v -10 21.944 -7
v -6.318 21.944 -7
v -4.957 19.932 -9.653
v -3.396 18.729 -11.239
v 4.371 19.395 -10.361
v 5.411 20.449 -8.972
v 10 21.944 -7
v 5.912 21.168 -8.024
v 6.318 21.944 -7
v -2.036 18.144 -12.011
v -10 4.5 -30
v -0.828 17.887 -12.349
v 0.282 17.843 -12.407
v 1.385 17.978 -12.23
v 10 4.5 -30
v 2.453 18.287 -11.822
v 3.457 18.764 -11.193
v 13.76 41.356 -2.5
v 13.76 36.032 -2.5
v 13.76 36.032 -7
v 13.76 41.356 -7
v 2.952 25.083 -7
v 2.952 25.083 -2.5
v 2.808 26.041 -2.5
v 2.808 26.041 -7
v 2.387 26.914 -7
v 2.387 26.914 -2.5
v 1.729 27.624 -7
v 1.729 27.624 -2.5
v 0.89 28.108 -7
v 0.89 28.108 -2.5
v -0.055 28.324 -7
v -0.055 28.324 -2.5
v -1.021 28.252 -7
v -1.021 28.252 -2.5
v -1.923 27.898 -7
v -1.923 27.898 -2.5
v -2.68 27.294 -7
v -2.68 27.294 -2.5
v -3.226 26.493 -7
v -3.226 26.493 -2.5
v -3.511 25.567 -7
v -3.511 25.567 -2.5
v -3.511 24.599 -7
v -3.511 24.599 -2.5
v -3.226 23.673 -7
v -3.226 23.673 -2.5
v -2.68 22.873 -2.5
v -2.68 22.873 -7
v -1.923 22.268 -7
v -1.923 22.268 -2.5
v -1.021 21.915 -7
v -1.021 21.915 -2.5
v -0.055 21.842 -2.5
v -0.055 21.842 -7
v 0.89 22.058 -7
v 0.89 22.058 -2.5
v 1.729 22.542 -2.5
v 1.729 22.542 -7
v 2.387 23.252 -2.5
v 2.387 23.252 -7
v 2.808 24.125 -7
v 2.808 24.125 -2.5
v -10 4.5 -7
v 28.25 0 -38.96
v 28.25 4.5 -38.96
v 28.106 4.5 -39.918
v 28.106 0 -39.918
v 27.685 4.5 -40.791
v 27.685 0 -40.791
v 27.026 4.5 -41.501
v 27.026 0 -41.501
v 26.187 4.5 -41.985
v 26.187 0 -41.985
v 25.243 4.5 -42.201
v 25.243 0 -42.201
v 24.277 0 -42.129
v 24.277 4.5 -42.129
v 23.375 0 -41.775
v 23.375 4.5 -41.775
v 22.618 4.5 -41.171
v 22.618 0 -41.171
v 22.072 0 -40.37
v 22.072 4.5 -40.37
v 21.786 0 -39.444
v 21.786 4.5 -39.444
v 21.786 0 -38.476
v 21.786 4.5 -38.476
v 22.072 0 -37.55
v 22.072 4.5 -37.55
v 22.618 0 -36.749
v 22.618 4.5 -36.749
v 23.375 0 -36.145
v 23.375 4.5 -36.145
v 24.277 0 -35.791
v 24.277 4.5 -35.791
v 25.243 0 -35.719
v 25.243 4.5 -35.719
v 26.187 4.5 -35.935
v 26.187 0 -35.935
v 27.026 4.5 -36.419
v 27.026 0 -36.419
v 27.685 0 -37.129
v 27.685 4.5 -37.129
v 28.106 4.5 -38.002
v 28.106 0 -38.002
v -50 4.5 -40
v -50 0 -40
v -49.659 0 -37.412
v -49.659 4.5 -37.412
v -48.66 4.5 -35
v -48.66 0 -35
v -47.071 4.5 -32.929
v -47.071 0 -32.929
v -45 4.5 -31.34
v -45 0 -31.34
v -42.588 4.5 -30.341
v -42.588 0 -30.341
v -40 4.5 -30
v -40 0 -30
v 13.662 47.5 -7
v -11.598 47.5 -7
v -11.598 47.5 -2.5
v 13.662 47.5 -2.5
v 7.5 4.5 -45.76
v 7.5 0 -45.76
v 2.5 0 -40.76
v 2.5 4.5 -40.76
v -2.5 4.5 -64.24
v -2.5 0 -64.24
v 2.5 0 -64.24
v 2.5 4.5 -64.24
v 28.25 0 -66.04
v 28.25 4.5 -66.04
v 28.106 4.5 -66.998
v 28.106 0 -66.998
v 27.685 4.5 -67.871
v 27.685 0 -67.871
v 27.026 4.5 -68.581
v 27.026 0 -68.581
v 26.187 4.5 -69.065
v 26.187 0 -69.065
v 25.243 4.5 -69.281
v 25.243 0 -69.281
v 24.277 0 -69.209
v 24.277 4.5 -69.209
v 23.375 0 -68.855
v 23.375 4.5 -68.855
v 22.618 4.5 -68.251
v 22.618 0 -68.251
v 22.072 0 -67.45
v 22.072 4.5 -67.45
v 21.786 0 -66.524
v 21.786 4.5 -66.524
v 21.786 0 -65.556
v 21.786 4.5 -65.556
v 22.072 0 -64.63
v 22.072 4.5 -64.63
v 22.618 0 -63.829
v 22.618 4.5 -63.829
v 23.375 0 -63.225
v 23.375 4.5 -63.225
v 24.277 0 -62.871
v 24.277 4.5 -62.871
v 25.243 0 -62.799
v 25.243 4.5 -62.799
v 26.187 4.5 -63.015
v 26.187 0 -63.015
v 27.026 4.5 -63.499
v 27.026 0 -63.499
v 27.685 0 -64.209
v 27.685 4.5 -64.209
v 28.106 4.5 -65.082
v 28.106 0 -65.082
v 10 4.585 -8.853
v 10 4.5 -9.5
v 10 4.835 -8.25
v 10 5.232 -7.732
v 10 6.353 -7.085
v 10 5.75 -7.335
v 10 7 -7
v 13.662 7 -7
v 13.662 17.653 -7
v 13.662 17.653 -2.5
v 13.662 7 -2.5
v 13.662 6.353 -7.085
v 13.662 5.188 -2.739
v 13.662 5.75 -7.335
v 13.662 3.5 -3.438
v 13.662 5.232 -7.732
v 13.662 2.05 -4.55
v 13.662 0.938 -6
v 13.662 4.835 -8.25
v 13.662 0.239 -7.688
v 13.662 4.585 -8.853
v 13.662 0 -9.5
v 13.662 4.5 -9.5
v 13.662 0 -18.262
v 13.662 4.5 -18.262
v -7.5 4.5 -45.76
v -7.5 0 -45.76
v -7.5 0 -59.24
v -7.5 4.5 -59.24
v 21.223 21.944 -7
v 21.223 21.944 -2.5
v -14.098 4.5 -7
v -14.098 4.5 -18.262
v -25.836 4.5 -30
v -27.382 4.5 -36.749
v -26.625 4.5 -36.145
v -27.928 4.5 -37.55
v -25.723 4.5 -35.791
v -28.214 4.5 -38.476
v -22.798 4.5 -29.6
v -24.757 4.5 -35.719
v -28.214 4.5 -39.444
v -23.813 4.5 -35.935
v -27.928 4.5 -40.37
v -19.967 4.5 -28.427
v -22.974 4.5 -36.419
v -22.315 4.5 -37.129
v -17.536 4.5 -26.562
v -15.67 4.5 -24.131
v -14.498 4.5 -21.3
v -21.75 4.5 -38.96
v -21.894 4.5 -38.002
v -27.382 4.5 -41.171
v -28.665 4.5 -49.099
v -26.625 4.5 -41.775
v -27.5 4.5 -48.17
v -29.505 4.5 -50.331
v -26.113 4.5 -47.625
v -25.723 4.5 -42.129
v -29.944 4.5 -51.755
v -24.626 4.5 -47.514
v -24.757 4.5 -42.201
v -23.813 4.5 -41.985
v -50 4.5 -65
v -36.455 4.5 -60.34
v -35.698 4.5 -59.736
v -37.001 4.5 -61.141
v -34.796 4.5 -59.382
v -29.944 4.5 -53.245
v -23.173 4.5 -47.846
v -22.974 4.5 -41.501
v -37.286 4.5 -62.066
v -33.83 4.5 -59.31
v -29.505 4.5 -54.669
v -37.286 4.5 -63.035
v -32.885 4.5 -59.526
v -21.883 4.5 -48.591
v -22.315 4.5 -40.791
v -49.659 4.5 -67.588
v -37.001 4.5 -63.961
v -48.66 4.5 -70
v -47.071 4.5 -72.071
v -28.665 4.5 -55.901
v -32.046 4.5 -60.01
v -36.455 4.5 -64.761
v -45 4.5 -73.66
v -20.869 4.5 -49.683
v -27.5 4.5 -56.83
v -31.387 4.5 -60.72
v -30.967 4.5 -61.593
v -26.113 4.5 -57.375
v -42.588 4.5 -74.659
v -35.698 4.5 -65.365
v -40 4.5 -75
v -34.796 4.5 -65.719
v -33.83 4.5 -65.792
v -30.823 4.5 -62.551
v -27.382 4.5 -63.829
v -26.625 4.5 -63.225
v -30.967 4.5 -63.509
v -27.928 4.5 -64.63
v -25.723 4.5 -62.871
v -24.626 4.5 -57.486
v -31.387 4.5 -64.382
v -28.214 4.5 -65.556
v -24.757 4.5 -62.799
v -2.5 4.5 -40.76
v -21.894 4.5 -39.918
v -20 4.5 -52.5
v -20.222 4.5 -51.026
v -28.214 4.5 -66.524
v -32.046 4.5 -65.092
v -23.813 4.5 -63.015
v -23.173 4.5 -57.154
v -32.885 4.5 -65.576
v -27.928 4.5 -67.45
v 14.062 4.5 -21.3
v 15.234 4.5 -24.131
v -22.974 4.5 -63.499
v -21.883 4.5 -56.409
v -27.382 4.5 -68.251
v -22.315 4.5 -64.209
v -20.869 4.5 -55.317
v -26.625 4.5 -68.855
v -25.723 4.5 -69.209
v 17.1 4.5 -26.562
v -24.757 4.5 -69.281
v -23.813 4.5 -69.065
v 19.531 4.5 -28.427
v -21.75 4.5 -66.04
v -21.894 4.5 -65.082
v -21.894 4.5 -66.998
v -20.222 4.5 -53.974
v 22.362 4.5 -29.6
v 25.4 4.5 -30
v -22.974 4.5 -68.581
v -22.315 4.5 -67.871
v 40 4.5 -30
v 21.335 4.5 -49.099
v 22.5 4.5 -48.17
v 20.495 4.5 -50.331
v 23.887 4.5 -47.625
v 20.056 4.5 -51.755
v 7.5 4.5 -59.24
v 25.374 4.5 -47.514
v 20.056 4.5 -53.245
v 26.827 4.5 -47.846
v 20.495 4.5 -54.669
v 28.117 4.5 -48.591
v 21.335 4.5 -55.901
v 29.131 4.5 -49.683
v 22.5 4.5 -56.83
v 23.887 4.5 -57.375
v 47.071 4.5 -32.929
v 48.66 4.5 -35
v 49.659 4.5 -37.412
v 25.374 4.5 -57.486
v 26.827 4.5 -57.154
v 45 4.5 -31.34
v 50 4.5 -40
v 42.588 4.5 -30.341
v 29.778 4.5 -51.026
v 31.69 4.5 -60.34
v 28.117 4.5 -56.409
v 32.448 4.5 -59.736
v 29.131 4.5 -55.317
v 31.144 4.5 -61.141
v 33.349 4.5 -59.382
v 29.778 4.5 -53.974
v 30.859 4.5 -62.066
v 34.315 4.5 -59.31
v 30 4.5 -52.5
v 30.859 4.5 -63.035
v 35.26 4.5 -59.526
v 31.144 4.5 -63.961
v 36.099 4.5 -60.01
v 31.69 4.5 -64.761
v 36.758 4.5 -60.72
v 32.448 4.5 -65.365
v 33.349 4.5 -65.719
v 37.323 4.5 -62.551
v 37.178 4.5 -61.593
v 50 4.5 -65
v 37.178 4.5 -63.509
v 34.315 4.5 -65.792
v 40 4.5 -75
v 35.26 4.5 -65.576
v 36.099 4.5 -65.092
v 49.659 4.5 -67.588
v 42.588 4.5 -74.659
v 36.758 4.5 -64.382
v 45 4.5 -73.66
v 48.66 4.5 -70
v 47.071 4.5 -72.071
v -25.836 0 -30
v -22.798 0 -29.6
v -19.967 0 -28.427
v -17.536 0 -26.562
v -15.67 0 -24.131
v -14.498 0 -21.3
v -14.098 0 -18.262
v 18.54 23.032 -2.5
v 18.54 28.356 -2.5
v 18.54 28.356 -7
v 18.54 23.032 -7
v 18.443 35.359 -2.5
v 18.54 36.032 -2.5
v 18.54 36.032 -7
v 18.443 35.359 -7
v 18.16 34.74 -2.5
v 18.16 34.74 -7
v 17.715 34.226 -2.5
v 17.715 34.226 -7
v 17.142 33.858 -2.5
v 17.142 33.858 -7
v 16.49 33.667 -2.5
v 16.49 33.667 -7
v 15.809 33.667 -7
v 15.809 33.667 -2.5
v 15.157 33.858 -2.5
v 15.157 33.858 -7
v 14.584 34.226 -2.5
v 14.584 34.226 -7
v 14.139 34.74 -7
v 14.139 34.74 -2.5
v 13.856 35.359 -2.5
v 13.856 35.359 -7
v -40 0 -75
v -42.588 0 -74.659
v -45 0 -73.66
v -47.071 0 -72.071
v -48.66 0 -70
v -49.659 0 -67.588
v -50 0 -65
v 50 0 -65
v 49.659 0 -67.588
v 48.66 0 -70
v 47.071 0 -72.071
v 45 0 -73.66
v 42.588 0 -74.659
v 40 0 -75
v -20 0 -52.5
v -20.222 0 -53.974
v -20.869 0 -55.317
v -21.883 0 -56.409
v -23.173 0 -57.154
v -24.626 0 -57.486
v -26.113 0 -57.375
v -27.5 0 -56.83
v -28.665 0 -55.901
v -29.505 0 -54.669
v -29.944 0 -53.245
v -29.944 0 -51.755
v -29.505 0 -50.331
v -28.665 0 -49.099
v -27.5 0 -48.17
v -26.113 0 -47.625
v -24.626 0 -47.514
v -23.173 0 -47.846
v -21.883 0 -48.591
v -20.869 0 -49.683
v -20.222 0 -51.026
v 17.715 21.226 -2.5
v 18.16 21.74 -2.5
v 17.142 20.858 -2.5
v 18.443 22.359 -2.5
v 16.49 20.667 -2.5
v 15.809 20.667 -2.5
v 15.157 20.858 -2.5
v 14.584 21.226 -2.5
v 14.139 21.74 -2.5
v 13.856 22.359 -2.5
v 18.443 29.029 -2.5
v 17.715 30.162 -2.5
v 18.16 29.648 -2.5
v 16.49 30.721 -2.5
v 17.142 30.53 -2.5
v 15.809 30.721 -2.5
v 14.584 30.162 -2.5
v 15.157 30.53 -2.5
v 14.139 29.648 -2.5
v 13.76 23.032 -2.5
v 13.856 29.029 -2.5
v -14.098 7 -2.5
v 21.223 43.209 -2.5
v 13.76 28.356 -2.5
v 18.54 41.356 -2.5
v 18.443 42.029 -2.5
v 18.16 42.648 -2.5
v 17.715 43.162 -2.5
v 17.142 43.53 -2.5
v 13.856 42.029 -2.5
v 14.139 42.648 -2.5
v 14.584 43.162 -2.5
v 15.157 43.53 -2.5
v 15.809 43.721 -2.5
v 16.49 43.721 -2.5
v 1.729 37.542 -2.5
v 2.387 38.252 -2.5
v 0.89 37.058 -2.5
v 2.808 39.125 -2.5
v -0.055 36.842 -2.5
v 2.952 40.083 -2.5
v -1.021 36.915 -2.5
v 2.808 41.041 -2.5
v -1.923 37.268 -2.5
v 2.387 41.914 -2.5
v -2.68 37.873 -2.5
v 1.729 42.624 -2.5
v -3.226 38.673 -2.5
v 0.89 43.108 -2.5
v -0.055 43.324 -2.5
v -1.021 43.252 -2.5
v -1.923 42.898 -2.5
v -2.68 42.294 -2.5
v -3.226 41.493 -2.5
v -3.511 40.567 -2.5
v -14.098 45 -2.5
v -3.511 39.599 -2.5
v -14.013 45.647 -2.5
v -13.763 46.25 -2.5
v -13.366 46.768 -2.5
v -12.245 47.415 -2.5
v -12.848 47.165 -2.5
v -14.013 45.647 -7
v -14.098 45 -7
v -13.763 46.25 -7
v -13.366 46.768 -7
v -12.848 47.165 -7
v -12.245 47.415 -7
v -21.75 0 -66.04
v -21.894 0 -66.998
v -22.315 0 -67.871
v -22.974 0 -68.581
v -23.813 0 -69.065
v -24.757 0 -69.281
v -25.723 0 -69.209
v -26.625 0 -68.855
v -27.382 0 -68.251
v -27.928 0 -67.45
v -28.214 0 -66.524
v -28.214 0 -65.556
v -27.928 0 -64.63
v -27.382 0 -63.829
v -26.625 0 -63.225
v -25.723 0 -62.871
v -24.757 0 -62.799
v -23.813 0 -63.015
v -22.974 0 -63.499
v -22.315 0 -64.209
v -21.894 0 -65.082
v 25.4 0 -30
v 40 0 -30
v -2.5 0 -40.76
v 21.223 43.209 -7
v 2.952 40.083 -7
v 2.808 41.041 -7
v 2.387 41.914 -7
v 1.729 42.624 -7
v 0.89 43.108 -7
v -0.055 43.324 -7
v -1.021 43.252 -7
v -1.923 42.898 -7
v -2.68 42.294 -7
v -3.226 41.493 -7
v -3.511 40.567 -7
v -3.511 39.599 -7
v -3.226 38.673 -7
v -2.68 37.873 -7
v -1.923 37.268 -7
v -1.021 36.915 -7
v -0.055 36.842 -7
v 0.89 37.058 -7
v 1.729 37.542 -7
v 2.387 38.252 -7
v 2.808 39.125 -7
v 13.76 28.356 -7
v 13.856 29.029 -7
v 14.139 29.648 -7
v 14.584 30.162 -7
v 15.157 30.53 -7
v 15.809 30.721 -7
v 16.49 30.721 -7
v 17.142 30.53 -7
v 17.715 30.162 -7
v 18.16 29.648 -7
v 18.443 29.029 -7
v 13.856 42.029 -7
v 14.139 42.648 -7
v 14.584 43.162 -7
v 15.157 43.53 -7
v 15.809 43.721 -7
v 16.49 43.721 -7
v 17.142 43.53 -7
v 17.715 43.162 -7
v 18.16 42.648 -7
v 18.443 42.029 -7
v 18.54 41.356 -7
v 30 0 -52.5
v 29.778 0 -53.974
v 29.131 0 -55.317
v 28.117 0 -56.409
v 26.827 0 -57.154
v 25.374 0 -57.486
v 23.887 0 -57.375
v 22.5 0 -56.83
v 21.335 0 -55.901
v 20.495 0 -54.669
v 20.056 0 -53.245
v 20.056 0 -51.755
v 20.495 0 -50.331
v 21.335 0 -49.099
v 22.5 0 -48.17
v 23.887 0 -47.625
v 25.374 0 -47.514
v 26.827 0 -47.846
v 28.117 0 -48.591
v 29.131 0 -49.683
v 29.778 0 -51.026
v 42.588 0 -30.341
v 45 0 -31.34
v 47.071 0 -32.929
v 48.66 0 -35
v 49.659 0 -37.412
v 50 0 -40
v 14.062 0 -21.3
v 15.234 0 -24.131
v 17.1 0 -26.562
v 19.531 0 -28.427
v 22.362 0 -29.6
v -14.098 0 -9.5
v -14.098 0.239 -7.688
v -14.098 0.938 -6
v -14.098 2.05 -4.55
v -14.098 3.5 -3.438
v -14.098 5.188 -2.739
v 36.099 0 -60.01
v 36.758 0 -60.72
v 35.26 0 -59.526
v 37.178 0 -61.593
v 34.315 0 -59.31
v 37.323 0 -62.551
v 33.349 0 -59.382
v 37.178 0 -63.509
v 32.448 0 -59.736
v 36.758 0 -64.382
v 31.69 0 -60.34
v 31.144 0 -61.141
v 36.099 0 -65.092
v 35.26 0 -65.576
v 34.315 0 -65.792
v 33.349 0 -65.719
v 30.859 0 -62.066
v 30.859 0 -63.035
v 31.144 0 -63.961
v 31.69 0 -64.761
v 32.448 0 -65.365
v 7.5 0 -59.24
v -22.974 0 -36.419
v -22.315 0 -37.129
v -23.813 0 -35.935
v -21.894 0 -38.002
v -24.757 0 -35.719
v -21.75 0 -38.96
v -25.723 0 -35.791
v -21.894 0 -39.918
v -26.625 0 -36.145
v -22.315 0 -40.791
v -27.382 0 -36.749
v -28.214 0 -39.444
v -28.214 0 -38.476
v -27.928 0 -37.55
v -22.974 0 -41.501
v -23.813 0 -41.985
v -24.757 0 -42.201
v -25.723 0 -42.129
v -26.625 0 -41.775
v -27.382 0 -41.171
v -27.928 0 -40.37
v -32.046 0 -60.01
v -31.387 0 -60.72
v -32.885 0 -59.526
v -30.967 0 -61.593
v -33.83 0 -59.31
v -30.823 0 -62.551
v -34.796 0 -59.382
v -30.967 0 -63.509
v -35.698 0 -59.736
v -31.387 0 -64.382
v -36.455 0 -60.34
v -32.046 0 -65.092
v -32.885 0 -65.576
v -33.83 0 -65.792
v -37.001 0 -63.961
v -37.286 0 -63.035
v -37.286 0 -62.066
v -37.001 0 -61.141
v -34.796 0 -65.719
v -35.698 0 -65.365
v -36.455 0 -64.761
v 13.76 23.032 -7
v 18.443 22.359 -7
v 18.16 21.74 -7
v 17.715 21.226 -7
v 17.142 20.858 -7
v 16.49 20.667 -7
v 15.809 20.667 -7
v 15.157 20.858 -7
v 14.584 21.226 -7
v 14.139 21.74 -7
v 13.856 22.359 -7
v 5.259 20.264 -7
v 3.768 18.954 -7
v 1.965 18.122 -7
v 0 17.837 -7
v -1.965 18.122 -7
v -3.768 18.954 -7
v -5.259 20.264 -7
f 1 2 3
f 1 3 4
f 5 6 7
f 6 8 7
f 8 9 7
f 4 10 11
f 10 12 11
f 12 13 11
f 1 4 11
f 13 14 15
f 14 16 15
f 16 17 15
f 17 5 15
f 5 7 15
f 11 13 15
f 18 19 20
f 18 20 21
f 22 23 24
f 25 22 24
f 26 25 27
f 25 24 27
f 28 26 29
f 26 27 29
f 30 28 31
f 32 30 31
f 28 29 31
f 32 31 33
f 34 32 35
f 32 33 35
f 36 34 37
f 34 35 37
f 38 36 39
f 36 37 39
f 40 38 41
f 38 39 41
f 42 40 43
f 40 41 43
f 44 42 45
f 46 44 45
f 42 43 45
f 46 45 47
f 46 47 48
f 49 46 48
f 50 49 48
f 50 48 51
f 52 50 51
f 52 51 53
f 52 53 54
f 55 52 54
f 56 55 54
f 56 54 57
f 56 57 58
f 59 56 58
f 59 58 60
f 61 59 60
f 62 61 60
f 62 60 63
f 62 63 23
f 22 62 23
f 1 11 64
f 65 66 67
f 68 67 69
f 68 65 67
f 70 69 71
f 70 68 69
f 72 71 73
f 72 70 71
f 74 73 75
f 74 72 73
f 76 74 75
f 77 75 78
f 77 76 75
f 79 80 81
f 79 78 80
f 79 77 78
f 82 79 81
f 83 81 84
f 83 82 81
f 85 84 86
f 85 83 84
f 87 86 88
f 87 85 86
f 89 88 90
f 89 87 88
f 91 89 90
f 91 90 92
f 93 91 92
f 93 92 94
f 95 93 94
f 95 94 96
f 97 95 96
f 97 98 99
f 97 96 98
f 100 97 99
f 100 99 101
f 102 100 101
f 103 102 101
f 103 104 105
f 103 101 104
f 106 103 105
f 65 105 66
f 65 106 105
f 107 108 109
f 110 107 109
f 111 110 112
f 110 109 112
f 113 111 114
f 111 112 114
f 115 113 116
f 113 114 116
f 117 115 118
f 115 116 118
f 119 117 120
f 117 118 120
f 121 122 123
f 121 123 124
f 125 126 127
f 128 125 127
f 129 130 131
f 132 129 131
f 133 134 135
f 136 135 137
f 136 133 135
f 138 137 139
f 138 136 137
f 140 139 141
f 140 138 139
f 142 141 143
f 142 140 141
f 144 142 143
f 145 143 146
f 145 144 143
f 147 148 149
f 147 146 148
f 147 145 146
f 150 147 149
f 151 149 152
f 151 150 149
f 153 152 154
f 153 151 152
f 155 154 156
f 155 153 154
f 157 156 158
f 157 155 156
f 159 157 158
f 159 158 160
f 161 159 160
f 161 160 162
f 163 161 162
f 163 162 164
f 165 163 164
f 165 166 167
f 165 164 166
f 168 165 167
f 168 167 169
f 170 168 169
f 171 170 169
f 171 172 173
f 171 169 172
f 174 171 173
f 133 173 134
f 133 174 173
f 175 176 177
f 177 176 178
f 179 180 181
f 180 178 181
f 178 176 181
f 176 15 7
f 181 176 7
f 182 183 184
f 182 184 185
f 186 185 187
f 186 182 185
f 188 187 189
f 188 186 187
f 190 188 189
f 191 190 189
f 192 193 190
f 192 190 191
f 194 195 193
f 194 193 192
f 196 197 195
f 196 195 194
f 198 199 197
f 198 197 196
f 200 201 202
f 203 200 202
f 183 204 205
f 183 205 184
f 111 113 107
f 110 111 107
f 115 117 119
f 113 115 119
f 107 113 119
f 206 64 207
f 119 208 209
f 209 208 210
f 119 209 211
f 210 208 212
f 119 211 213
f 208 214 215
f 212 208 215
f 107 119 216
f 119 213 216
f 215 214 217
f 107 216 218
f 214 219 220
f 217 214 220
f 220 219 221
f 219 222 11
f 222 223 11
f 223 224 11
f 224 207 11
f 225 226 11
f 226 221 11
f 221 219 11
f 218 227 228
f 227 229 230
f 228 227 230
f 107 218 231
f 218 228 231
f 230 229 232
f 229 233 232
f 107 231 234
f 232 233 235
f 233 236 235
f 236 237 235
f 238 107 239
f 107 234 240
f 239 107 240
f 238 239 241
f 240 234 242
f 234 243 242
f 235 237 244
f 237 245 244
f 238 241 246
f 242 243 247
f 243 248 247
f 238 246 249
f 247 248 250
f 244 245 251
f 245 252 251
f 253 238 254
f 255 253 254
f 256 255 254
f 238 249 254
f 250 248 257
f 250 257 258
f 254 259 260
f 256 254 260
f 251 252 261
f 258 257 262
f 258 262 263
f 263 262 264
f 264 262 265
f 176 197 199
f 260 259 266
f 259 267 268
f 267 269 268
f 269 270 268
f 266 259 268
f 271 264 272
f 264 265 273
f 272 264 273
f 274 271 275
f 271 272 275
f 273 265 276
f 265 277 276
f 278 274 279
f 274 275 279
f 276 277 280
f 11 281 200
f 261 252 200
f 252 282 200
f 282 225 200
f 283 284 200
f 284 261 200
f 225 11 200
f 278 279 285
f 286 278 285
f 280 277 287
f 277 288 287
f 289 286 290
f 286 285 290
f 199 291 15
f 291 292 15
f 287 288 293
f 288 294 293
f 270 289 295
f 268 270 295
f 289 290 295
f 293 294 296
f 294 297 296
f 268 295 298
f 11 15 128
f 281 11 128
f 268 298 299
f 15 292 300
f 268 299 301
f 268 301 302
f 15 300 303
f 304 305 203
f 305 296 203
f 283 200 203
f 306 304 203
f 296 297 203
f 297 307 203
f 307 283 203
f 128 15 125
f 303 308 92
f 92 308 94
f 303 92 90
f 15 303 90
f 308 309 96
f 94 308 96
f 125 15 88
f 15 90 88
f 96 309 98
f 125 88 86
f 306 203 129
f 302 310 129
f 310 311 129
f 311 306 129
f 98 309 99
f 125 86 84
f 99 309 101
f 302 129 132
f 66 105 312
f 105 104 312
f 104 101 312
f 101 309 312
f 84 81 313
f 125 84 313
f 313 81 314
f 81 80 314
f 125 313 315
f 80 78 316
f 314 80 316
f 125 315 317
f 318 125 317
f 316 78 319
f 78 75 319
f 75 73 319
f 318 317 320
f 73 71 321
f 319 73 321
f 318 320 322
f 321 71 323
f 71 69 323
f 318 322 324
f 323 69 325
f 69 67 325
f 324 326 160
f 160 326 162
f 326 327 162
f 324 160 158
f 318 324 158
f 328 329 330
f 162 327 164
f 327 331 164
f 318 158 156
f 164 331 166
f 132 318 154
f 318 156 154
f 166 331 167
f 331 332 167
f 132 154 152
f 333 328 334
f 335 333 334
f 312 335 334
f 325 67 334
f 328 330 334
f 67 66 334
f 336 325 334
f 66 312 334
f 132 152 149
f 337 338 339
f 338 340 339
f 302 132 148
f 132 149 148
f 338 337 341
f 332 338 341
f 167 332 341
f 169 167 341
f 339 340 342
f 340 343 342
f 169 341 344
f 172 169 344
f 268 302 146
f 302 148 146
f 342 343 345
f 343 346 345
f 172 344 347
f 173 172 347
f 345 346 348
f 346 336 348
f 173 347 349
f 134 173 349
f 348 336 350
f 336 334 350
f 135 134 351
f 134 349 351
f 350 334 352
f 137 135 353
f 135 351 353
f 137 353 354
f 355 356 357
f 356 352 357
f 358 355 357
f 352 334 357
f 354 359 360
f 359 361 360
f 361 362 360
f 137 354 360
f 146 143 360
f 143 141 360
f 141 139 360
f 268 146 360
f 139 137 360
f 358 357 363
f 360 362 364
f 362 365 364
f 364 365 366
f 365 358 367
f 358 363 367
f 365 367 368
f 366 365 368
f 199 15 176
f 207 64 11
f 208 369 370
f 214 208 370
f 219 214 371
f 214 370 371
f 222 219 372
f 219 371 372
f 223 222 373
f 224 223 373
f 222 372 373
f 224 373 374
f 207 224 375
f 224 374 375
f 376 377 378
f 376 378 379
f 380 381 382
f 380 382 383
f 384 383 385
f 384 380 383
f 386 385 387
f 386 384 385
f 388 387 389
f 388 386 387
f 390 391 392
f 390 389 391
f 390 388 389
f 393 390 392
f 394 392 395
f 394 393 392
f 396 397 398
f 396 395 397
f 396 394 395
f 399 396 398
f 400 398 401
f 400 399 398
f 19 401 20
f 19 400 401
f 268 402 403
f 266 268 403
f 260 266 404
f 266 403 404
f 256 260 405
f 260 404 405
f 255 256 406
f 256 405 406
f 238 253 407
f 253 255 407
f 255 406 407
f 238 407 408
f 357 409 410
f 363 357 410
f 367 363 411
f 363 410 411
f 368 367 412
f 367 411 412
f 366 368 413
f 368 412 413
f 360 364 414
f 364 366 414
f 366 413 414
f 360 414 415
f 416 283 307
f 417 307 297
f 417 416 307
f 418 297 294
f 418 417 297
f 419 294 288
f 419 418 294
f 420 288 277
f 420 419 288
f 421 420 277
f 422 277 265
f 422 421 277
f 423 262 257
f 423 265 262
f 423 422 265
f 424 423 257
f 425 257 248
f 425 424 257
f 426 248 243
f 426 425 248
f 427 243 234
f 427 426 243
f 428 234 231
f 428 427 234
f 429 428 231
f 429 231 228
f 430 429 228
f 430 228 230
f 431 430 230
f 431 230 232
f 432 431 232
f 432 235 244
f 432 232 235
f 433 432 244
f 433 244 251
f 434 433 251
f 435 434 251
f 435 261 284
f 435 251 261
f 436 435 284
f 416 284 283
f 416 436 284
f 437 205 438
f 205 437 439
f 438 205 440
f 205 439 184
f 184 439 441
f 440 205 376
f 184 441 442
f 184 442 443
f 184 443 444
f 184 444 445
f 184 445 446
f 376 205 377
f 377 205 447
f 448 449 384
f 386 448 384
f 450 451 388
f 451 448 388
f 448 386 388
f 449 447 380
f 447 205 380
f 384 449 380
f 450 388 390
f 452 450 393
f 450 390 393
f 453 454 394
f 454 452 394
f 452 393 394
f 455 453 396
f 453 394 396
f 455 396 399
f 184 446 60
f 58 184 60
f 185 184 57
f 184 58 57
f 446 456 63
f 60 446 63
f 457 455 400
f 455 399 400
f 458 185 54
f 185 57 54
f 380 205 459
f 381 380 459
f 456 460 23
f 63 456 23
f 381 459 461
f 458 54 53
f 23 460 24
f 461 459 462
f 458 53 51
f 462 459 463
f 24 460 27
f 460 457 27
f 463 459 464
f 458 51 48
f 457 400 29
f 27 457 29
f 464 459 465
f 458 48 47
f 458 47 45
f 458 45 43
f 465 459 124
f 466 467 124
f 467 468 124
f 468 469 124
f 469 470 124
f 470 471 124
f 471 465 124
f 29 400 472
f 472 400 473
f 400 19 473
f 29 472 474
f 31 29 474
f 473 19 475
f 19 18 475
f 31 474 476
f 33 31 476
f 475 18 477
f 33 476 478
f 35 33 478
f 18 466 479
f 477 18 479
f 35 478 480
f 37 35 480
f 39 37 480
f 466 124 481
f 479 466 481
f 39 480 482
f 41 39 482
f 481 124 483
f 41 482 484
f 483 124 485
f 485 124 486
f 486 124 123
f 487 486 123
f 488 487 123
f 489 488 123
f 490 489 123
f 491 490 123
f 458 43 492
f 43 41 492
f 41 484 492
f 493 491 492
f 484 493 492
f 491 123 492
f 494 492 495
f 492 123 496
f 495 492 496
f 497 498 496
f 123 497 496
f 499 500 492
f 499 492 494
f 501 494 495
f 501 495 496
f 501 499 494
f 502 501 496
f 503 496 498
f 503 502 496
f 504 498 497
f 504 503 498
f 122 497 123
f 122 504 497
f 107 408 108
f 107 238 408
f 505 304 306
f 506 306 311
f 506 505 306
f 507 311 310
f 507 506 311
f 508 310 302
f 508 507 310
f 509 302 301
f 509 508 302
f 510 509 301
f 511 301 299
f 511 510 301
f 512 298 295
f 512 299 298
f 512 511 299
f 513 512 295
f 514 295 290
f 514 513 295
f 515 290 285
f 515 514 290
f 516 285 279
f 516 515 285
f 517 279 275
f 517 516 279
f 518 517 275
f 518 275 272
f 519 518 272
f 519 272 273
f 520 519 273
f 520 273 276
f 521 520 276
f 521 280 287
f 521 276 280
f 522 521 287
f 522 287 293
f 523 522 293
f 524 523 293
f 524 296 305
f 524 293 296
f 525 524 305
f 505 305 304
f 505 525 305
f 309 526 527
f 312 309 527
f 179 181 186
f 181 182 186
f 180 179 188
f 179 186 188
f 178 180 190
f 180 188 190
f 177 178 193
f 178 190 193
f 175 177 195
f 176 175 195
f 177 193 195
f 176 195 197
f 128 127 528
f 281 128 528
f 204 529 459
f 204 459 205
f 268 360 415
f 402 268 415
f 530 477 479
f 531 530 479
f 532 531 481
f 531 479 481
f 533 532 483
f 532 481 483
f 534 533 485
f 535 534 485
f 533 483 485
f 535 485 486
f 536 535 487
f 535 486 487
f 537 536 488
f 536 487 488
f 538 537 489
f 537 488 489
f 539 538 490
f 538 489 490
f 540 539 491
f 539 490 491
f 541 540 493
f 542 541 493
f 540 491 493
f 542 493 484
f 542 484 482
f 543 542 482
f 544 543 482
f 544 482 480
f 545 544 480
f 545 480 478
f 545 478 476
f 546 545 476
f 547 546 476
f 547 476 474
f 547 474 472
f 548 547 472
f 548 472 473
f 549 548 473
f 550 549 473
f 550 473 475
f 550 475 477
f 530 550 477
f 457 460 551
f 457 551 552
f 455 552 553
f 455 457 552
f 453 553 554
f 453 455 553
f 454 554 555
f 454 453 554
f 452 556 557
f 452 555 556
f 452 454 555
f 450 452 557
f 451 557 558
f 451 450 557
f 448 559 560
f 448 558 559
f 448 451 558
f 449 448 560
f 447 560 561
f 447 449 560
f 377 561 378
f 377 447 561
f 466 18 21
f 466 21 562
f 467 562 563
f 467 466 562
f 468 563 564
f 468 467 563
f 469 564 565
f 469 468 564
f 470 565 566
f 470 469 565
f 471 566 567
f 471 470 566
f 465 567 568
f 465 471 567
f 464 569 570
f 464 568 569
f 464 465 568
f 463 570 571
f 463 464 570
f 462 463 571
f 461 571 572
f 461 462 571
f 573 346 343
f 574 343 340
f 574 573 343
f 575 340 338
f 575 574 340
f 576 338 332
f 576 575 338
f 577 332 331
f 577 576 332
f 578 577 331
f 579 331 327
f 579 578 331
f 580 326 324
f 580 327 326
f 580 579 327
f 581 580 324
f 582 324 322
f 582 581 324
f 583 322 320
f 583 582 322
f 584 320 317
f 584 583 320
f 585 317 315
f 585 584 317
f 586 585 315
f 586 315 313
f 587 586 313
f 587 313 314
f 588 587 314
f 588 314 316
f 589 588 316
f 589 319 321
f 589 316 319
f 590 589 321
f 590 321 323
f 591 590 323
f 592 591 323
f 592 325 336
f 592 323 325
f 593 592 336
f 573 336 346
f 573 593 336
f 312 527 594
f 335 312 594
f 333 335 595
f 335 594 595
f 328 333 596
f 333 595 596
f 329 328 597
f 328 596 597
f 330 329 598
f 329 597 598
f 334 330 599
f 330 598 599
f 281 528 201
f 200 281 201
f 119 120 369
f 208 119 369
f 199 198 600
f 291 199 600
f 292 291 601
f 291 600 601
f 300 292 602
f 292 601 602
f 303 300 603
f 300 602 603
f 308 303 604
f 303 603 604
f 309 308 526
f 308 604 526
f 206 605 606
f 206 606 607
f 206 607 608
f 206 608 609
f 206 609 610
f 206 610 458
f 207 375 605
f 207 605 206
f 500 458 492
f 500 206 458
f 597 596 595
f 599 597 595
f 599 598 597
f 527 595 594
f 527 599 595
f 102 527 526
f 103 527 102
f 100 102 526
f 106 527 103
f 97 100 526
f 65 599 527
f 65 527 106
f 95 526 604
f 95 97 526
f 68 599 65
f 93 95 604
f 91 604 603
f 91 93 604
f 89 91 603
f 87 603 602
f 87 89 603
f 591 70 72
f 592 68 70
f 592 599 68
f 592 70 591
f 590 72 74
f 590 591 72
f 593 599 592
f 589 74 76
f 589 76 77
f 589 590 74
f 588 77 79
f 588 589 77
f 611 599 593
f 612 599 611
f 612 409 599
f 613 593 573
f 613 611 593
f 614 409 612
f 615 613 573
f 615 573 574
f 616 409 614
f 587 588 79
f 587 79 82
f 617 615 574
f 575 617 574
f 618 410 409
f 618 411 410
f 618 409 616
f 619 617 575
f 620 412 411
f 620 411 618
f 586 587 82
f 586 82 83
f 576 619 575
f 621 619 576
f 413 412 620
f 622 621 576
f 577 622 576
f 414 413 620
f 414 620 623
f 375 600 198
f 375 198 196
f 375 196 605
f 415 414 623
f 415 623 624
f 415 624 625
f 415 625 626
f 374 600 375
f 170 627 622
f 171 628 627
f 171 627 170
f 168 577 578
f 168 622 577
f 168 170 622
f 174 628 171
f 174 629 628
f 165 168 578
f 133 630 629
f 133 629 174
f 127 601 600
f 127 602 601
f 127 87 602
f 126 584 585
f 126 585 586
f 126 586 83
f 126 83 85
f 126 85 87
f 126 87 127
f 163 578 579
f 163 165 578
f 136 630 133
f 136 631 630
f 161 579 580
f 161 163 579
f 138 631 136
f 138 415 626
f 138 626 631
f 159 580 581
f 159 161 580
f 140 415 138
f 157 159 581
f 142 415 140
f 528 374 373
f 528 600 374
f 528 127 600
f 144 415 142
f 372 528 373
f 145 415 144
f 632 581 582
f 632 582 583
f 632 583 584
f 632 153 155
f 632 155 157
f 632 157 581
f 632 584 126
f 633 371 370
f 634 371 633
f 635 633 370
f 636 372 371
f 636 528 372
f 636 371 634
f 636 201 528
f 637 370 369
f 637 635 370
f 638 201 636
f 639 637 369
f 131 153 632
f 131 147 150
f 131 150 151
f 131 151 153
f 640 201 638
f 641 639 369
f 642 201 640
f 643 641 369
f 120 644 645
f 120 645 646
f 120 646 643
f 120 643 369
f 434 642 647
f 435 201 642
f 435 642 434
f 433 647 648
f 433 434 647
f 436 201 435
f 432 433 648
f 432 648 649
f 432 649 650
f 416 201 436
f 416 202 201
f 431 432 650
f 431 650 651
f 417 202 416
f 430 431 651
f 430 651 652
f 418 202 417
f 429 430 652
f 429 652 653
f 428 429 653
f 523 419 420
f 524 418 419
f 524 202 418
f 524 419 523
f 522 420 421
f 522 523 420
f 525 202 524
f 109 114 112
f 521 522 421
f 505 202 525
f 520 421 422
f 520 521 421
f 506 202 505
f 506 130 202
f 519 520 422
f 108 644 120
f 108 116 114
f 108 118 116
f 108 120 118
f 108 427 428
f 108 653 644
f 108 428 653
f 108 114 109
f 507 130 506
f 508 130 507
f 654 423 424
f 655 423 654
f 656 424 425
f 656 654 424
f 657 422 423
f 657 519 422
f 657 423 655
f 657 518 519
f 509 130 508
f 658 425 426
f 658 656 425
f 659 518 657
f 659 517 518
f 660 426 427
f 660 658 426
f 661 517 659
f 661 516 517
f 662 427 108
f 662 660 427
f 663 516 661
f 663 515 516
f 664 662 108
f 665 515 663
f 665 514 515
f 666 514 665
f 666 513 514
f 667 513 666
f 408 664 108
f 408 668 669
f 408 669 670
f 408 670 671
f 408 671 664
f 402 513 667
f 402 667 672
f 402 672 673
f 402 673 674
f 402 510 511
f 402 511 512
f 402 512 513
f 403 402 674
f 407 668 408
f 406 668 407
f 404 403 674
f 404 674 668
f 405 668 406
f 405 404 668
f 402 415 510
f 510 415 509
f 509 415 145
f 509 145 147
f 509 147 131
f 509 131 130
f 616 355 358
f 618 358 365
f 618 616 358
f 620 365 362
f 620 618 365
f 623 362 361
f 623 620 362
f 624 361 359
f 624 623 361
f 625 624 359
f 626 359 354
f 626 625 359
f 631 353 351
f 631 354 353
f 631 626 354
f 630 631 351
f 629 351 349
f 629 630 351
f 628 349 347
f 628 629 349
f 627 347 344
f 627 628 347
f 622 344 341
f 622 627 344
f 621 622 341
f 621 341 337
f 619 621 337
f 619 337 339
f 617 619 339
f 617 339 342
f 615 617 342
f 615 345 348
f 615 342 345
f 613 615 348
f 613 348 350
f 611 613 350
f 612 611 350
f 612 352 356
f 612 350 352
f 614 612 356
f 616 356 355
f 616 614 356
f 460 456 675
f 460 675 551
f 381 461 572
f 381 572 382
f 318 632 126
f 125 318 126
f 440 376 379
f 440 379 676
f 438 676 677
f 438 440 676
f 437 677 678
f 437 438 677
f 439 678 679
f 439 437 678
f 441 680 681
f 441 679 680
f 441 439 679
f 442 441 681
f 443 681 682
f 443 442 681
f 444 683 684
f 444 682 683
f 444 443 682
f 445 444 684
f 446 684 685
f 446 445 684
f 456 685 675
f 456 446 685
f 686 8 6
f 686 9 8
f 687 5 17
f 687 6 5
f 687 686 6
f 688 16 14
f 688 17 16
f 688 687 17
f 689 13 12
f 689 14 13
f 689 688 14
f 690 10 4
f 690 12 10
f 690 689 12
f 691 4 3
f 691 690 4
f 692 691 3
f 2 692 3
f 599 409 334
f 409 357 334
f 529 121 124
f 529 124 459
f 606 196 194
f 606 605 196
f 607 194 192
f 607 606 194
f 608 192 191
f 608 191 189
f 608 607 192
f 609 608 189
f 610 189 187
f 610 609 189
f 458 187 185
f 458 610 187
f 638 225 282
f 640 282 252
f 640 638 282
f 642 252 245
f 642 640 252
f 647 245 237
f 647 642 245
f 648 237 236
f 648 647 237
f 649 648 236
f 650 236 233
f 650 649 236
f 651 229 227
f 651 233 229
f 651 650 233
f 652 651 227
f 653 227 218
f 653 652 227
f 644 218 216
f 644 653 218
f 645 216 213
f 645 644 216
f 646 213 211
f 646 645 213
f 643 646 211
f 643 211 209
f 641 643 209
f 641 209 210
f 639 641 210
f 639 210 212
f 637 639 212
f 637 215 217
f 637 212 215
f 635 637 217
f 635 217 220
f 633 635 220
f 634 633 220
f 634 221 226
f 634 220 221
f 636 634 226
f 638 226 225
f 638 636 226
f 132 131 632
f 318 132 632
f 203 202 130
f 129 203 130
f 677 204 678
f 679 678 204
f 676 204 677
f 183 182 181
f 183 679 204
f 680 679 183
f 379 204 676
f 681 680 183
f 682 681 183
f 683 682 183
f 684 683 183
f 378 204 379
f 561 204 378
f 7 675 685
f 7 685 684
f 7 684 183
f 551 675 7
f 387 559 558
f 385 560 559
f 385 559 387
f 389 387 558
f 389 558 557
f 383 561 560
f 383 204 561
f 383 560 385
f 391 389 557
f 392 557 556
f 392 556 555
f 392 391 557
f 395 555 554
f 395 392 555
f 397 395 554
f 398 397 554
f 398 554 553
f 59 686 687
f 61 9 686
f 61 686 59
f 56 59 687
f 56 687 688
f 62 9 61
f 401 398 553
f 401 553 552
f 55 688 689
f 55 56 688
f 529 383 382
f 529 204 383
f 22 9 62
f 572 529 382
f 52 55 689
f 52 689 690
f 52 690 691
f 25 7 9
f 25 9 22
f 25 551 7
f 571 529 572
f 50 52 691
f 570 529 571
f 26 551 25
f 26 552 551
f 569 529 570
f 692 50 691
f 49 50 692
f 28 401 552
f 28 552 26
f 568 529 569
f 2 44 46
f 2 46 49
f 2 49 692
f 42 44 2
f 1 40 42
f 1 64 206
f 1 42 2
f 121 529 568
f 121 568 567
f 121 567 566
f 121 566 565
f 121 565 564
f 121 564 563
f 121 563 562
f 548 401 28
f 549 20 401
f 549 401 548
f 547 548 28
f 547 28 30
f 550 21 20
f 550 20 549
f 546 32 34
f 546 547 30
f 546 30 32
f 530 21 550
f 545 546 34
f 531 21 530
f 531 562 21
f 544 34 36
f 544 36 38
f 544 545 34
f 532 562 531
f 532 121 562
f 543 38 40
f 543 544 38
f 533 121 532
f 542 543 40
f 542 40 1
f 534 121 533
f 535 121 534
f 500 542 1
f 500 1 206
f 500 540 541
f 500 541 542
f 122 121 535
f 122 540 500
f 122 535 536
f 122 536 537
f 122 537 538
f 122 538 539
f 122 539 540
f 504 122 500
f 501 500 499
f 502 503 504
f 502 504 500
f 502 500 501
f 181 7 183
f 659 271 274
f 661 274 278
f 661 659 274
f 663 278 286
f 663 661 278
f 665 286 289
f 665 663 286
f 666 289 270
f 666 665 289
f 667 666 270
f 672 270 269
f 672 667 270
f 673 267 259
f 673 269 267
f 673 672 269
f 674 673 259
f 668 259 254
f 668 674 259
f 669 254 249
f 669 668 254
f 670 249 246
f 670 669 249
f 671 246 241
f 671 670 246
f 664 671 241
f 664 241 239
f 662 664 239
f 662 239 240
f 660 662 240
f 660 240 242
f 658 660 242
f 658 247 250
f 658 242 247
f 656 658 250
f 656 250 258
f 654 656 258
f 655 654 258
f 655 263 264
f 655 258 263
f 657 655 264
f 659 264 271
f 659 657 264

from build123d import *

# Parameters (mm, degrees)
BOSS_EXTRUDE1_DEPTH       = 50
SKETCH2_OUTSIDE_W         = 128.57
SKETCH2_OUTSIDE_H         = 103.57
SKETCH2_OUTSIDE_R         = 5
SKETCH2_OUTSIDE_R_2       = 3.25
CUT_EXTRUDE34_DEPTH       = 46
CUT_EXTRUDE34_DEPTH_BACK  = 1
BOSS_EXTRUDE3_DEPTH       = 4.5
SUPPORT_DEPTH             = 10
FILLET3_R                 = 2.5
FILLET4_R                 = 7
SKETCH6_R                 = 3.25
LOADCELL_MOUNT_DEPTH      = 1
LOADCELL_MOUNT_DEPTH_BACK = 73.5
WIREHOLE_DEPTH            = 5.18
SKETCH9_R                 = 6.912708826
CUT_EXTRUDE35_DEPTH       = 10


with BuildPart() as part:
    # Sketch1 → Boss-Extrude1 (new body, symmetric)
    with BuildSketch(Plane(origin=(0, 0, 0), x_dir=(0, 0, -1), z_dir=(1, 0, 0))):
        Polygon((0, 0), (0, 45), (4.5, 45), (4.5, 4.5), (75, 4.5), (75, 0), align=None)
    extrude(amount=BOSS_EXTRUDE1_DEPTH, both=True)

    # Sketch2 outside → Cut-Extrude34 (cut, two sides)
    with BuildSketch(Plane(origin=(0, 0, 0), x_dir=(1, 0, 0), z_dir=(0, 1, 0))) as cut_extrude34_sk:
        with Locations((0, 37.5)):
            Rectangle(SKETCH2_OUTSIDE_W, SKETCH2_OUTSIDE_H)
        with BuildLine():
            Line((-40, 30), (-25.836010131, 30))
            ThreePointArc((-25.836010131, 30), (-17.535836731, 26.561955607), (-14.097792338, 18.261782207))
            Line((-14.097792338, 18.261782207), (-14.097792338, 7))
            Line((-14.097792338, 7), (13.661782207, 7))
            Line((13.661782207, 7), (13.661782207, 18.261782207))
            ThreePointArc((13.661782207, 18.261782207), (17.099826599, 26.561955607), (25.4, 30))
            Line((25.4, 30), (40, 30))
            ThreePointArc((40, 30), (47.071067812, 32.928932188), (50, 40))
            Line((50, 40), (50, 65))
            ThreePointArc((50, 65), (47.071067812, 72.071067812), (40, 75))
            Line((40, 75), (-40, 75))
            ThreePointArc((-40, 75), (-47.071067812, 72.071067812), (-50, 65))
            Line((-50, 65), (-50, 40))
            ThreePointArc((-50, 40), (-47.071067812, 32.928932188), (-40, 30))
        make_face(mode=Mode.SUBTRACT)
        with Locations((-25, 52.5)):
            Circle(SKETCH2_OUTSIDE_R)
        with Locations((25, 52.5)):
            Circle(SKETCH2_OUTSIDE_R)
        with Locations((25, 66.04)):
            Circle(SKETCH2_OUTSIDE_R_2)
        with Locations((25, 38.96)):
            Circle(SKETCH2_OUTSIDE_R_2)
        with Locations((34.072580566, 62.550864733)):
            Circle(SKETCH2_OUTSIDE_R_2)
        with Locations((-25, 66.04)):
            Circle(SKETCH2_OUTSIDE_R_2)
        with Locations((-25, 38.96)):
            Circle(SKETCH2_OUTSIDE_R_2)
        with Locations((-34.072580566, 62.550864733)):
            Circle(SKETCH2_OUTSIDE_R_2)
        Polygon((-2.5, 64.24), (2.5, 64.24), (7.5, 59.24), (7.5, 45.76), (2.5, 40.76), (-2.5, 40.76), (-7.5, 45.76), (-7.5, 59.24), align=None)
    extrude(amount=CUT_EXTRUDE34_DEPTH, mode=Mode.SUBTRACT)
    extrude(cut_extrude34_sk.sketch, amount=-CUT_EXTRUDE34_DEPTH_BACK, mode=Mode.SUBTRACT)

    # Sketch4 → Boss-Extrude3 (add)
    with BuildSketch(Plane.XY.offset(-7)):
        with BuildLine():
            Line((-14.097792338, 0), (-14.097792338, 45))
            ThreePointArc((-14.097792338, 45), (-13.365559291, 46.767766953), (-11.597792338, 47.5))
            Line((-11.597792338, 47.5), (13.661782207, 47.5))
            Line((13.661782207, 47.5), (21.222778521, 43.209368433))
            Line((21.222778521, 43.209368433), (21.222778521, 21.944029683))
            Line((21.222778521, 21.944029683), (13.661782207, 17.653398116))
            Line((13.661782207, 17.653398116), (13.661782207, 4.5))
            Line((13.661782207, 4.5), (13.661782207, 0))
            Line((13.661782207, 0), (-14.097792338, 0))
        make_face()
    extrude(amount=BOSS_EXTRUDE3_DEPTH)

    # Sketch → Support (add, symmetric)
    with BuildSketch(Plane(origin=(0, 0, 0), x_dir=(0, 0, -1), z_dir=(1, 0, 0))):
        Polygon((7, 21.944029683), (30, 4.5), (7, 4.5), align=None)
    extrude(amount=SUPPORT_DEPTH, both=True)

    # Fillet3
    fillet3_edges = [part.edges().sort_by_distance(p)[0] for p in [
        (11.830891103, 4.5, -7),
    ]]
    fillet(fillet3_edges, radius=FILLET3_R)

    # Fillet4
    fillet4_edges = [part.edges().sort_by_distance(p)[0] for p in [
        (-0.218005066, 0, -2.5),
    ]]
    fillet(fillet4_edges, radius=FILLET4_R)

    # Sketch6 → LoadCell_Mount (cut, two sides)
    with BuildSketch(Plane.XY.offset(-2.5)) as loadcell_mount_sk:
        with Locations((-0.297792338, 40.083077312)):
            Circle(SKETCH6_R)
        with Locations((-0.297792338, 25.083077312)):
            Circle(SKETCH6_R)
    extrude(amount=LOADCELL_MOUNT_DEPTH, mode=Mode.SUBTRACT)
    extrude(loadcell_mount_sk.sketch, amount=-LOADCELL_MOUNT_DEPTH_BACK, mode=Mode.SUBTRACT)

    # Sketch7 → WireHole (cut)
    with BuildSketch(Plane.XY.offset(-2.5)):
        with BuildLine():
            Line((18.539617084, 41.355633115), (18.539617084, 36.032215871))
            ThreePointArc((18.539617084, 36.032215871), (16.149617084, 33.642215871), (13.759617084, 36.032215871))
            Line((13.759617084, 36.032215871), (13.759617084, 41.355633115))
            ThreePointArc((13.759617084, 41.355633115), (16.149617084, 43.745633115), (18.539617084, 41.355633115))
        make_face()
        with BuildLine():
            Line((18.539617084, 28.355633115), (18.539617084, 23.032215871))
            ThreePointArc((18.539617084, 23.032215871), (16.149617084, 20.642215871), (13.759617084, 23.032215871))
            Line((13.759617084, 23.032215871), (13.759617084, 28.355633115))
            ThreePointArc((13.759617084, 28.355633115), (16.149617084, 30.745633115), (18.539617084, 28.355633115))
        make_face()
    extrude(amount=-WIREHOLE_DEPTH, mode=Mode.SUBTRACT)

    # Sketch9 → Cut-Extrude35 (cut)
    with BuildSketch(Plane(origin=(0, 0, -7), x_dir=(-1, 0, 0), z_dir=(0, 0, -1))):
        with Locations((0, 24.75)):
            Circle(SKETCH9_R)
    extrude(amount=CUT_EXTRUDE35_DEPTH, mode=Mode.SUBTRACT)


solid = part.part
